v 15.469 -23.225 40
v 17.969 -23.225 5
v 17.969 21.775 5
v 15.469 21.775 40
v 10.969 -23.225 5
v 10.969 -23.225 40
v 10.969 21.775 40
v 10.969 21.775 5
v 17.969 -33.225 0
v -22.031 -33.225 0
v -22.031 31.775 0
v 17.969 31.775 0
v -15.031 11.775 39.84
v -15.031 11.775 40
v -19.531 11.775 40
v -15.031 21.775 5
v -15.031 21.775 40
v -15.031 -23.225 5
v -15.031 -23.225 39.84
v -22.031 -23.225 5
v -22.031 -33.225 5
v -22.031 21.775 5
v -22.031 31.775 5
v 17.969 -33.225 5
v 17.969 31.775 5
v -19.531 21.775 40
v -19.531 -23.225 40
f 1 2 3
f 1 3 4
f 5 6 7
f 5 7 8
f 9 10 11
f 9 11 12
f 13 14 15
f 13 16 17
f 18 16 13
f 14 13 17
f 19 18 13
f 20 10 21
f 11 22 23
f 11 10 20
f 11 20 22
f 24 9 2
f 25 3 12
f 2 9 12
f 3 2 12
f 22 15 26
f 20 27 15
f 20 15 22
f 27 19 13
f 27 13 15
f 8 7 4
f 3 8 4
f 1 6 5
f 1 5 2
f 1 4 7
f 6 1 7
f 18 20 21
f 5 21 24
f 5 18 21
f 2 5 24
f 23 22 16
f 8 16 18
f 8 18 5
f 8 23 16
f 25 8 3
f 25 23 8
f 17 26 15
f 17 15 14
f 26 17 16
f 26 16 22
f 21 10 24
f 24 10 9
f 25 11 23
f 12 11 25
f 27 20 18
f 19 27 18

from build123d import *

# Parameters (mm, degrees)
F0_W     = 40
F0_H     = 65
F1_DEPTH = 5
F6_DEPTH = 10
F8_DEPTH = 45


with BuildPart() as f1:
    # F0 (on Top) → F1 (new body)
    with BuildSketch(Plane.XY):
        with Locations((-2.0310617983, -0.7245496807)):
            Rectangle(F0_W, F0_H)
    extrude(amount=F1_DEPTH)

    # F5 (on face) → F6 (join)
    with BuildSketch(Plane(origin=(0, 21.7754503193, 0), x_dir=(-1, 0, 0), z_dir=(0, 1, 0))):
        Polygon((15.0310617983, 40), (15.0310617983, 5), (22.0310617983, 5), (19.5310617983, 40), align=None)
        Polygon((-17.9689382017, 5), (-10.9689382017, 5), (-10.9689382017, 39.8395545781), (-15.4689382017, 40), align=None)
    extrude(amount=-F6_DEPTH)

    # F7 (on offset) → F8 (join)
    with BuildSketch(Plane.XZ.offset(23.2245496807)):
        Polygon((10.9689382017, 40), (10.9689382017, 5), (17.9689382017, 5), (15.4689382017, 40), align=None)
        Polygon((-22.0310617983, 5), (-15.0310617983, 5), (-15.0310617983, 39.8395545781), (-19.5310617983, 40), align=None)
    extrude(amount=-F8_DEPTH)


solid = f1.part
